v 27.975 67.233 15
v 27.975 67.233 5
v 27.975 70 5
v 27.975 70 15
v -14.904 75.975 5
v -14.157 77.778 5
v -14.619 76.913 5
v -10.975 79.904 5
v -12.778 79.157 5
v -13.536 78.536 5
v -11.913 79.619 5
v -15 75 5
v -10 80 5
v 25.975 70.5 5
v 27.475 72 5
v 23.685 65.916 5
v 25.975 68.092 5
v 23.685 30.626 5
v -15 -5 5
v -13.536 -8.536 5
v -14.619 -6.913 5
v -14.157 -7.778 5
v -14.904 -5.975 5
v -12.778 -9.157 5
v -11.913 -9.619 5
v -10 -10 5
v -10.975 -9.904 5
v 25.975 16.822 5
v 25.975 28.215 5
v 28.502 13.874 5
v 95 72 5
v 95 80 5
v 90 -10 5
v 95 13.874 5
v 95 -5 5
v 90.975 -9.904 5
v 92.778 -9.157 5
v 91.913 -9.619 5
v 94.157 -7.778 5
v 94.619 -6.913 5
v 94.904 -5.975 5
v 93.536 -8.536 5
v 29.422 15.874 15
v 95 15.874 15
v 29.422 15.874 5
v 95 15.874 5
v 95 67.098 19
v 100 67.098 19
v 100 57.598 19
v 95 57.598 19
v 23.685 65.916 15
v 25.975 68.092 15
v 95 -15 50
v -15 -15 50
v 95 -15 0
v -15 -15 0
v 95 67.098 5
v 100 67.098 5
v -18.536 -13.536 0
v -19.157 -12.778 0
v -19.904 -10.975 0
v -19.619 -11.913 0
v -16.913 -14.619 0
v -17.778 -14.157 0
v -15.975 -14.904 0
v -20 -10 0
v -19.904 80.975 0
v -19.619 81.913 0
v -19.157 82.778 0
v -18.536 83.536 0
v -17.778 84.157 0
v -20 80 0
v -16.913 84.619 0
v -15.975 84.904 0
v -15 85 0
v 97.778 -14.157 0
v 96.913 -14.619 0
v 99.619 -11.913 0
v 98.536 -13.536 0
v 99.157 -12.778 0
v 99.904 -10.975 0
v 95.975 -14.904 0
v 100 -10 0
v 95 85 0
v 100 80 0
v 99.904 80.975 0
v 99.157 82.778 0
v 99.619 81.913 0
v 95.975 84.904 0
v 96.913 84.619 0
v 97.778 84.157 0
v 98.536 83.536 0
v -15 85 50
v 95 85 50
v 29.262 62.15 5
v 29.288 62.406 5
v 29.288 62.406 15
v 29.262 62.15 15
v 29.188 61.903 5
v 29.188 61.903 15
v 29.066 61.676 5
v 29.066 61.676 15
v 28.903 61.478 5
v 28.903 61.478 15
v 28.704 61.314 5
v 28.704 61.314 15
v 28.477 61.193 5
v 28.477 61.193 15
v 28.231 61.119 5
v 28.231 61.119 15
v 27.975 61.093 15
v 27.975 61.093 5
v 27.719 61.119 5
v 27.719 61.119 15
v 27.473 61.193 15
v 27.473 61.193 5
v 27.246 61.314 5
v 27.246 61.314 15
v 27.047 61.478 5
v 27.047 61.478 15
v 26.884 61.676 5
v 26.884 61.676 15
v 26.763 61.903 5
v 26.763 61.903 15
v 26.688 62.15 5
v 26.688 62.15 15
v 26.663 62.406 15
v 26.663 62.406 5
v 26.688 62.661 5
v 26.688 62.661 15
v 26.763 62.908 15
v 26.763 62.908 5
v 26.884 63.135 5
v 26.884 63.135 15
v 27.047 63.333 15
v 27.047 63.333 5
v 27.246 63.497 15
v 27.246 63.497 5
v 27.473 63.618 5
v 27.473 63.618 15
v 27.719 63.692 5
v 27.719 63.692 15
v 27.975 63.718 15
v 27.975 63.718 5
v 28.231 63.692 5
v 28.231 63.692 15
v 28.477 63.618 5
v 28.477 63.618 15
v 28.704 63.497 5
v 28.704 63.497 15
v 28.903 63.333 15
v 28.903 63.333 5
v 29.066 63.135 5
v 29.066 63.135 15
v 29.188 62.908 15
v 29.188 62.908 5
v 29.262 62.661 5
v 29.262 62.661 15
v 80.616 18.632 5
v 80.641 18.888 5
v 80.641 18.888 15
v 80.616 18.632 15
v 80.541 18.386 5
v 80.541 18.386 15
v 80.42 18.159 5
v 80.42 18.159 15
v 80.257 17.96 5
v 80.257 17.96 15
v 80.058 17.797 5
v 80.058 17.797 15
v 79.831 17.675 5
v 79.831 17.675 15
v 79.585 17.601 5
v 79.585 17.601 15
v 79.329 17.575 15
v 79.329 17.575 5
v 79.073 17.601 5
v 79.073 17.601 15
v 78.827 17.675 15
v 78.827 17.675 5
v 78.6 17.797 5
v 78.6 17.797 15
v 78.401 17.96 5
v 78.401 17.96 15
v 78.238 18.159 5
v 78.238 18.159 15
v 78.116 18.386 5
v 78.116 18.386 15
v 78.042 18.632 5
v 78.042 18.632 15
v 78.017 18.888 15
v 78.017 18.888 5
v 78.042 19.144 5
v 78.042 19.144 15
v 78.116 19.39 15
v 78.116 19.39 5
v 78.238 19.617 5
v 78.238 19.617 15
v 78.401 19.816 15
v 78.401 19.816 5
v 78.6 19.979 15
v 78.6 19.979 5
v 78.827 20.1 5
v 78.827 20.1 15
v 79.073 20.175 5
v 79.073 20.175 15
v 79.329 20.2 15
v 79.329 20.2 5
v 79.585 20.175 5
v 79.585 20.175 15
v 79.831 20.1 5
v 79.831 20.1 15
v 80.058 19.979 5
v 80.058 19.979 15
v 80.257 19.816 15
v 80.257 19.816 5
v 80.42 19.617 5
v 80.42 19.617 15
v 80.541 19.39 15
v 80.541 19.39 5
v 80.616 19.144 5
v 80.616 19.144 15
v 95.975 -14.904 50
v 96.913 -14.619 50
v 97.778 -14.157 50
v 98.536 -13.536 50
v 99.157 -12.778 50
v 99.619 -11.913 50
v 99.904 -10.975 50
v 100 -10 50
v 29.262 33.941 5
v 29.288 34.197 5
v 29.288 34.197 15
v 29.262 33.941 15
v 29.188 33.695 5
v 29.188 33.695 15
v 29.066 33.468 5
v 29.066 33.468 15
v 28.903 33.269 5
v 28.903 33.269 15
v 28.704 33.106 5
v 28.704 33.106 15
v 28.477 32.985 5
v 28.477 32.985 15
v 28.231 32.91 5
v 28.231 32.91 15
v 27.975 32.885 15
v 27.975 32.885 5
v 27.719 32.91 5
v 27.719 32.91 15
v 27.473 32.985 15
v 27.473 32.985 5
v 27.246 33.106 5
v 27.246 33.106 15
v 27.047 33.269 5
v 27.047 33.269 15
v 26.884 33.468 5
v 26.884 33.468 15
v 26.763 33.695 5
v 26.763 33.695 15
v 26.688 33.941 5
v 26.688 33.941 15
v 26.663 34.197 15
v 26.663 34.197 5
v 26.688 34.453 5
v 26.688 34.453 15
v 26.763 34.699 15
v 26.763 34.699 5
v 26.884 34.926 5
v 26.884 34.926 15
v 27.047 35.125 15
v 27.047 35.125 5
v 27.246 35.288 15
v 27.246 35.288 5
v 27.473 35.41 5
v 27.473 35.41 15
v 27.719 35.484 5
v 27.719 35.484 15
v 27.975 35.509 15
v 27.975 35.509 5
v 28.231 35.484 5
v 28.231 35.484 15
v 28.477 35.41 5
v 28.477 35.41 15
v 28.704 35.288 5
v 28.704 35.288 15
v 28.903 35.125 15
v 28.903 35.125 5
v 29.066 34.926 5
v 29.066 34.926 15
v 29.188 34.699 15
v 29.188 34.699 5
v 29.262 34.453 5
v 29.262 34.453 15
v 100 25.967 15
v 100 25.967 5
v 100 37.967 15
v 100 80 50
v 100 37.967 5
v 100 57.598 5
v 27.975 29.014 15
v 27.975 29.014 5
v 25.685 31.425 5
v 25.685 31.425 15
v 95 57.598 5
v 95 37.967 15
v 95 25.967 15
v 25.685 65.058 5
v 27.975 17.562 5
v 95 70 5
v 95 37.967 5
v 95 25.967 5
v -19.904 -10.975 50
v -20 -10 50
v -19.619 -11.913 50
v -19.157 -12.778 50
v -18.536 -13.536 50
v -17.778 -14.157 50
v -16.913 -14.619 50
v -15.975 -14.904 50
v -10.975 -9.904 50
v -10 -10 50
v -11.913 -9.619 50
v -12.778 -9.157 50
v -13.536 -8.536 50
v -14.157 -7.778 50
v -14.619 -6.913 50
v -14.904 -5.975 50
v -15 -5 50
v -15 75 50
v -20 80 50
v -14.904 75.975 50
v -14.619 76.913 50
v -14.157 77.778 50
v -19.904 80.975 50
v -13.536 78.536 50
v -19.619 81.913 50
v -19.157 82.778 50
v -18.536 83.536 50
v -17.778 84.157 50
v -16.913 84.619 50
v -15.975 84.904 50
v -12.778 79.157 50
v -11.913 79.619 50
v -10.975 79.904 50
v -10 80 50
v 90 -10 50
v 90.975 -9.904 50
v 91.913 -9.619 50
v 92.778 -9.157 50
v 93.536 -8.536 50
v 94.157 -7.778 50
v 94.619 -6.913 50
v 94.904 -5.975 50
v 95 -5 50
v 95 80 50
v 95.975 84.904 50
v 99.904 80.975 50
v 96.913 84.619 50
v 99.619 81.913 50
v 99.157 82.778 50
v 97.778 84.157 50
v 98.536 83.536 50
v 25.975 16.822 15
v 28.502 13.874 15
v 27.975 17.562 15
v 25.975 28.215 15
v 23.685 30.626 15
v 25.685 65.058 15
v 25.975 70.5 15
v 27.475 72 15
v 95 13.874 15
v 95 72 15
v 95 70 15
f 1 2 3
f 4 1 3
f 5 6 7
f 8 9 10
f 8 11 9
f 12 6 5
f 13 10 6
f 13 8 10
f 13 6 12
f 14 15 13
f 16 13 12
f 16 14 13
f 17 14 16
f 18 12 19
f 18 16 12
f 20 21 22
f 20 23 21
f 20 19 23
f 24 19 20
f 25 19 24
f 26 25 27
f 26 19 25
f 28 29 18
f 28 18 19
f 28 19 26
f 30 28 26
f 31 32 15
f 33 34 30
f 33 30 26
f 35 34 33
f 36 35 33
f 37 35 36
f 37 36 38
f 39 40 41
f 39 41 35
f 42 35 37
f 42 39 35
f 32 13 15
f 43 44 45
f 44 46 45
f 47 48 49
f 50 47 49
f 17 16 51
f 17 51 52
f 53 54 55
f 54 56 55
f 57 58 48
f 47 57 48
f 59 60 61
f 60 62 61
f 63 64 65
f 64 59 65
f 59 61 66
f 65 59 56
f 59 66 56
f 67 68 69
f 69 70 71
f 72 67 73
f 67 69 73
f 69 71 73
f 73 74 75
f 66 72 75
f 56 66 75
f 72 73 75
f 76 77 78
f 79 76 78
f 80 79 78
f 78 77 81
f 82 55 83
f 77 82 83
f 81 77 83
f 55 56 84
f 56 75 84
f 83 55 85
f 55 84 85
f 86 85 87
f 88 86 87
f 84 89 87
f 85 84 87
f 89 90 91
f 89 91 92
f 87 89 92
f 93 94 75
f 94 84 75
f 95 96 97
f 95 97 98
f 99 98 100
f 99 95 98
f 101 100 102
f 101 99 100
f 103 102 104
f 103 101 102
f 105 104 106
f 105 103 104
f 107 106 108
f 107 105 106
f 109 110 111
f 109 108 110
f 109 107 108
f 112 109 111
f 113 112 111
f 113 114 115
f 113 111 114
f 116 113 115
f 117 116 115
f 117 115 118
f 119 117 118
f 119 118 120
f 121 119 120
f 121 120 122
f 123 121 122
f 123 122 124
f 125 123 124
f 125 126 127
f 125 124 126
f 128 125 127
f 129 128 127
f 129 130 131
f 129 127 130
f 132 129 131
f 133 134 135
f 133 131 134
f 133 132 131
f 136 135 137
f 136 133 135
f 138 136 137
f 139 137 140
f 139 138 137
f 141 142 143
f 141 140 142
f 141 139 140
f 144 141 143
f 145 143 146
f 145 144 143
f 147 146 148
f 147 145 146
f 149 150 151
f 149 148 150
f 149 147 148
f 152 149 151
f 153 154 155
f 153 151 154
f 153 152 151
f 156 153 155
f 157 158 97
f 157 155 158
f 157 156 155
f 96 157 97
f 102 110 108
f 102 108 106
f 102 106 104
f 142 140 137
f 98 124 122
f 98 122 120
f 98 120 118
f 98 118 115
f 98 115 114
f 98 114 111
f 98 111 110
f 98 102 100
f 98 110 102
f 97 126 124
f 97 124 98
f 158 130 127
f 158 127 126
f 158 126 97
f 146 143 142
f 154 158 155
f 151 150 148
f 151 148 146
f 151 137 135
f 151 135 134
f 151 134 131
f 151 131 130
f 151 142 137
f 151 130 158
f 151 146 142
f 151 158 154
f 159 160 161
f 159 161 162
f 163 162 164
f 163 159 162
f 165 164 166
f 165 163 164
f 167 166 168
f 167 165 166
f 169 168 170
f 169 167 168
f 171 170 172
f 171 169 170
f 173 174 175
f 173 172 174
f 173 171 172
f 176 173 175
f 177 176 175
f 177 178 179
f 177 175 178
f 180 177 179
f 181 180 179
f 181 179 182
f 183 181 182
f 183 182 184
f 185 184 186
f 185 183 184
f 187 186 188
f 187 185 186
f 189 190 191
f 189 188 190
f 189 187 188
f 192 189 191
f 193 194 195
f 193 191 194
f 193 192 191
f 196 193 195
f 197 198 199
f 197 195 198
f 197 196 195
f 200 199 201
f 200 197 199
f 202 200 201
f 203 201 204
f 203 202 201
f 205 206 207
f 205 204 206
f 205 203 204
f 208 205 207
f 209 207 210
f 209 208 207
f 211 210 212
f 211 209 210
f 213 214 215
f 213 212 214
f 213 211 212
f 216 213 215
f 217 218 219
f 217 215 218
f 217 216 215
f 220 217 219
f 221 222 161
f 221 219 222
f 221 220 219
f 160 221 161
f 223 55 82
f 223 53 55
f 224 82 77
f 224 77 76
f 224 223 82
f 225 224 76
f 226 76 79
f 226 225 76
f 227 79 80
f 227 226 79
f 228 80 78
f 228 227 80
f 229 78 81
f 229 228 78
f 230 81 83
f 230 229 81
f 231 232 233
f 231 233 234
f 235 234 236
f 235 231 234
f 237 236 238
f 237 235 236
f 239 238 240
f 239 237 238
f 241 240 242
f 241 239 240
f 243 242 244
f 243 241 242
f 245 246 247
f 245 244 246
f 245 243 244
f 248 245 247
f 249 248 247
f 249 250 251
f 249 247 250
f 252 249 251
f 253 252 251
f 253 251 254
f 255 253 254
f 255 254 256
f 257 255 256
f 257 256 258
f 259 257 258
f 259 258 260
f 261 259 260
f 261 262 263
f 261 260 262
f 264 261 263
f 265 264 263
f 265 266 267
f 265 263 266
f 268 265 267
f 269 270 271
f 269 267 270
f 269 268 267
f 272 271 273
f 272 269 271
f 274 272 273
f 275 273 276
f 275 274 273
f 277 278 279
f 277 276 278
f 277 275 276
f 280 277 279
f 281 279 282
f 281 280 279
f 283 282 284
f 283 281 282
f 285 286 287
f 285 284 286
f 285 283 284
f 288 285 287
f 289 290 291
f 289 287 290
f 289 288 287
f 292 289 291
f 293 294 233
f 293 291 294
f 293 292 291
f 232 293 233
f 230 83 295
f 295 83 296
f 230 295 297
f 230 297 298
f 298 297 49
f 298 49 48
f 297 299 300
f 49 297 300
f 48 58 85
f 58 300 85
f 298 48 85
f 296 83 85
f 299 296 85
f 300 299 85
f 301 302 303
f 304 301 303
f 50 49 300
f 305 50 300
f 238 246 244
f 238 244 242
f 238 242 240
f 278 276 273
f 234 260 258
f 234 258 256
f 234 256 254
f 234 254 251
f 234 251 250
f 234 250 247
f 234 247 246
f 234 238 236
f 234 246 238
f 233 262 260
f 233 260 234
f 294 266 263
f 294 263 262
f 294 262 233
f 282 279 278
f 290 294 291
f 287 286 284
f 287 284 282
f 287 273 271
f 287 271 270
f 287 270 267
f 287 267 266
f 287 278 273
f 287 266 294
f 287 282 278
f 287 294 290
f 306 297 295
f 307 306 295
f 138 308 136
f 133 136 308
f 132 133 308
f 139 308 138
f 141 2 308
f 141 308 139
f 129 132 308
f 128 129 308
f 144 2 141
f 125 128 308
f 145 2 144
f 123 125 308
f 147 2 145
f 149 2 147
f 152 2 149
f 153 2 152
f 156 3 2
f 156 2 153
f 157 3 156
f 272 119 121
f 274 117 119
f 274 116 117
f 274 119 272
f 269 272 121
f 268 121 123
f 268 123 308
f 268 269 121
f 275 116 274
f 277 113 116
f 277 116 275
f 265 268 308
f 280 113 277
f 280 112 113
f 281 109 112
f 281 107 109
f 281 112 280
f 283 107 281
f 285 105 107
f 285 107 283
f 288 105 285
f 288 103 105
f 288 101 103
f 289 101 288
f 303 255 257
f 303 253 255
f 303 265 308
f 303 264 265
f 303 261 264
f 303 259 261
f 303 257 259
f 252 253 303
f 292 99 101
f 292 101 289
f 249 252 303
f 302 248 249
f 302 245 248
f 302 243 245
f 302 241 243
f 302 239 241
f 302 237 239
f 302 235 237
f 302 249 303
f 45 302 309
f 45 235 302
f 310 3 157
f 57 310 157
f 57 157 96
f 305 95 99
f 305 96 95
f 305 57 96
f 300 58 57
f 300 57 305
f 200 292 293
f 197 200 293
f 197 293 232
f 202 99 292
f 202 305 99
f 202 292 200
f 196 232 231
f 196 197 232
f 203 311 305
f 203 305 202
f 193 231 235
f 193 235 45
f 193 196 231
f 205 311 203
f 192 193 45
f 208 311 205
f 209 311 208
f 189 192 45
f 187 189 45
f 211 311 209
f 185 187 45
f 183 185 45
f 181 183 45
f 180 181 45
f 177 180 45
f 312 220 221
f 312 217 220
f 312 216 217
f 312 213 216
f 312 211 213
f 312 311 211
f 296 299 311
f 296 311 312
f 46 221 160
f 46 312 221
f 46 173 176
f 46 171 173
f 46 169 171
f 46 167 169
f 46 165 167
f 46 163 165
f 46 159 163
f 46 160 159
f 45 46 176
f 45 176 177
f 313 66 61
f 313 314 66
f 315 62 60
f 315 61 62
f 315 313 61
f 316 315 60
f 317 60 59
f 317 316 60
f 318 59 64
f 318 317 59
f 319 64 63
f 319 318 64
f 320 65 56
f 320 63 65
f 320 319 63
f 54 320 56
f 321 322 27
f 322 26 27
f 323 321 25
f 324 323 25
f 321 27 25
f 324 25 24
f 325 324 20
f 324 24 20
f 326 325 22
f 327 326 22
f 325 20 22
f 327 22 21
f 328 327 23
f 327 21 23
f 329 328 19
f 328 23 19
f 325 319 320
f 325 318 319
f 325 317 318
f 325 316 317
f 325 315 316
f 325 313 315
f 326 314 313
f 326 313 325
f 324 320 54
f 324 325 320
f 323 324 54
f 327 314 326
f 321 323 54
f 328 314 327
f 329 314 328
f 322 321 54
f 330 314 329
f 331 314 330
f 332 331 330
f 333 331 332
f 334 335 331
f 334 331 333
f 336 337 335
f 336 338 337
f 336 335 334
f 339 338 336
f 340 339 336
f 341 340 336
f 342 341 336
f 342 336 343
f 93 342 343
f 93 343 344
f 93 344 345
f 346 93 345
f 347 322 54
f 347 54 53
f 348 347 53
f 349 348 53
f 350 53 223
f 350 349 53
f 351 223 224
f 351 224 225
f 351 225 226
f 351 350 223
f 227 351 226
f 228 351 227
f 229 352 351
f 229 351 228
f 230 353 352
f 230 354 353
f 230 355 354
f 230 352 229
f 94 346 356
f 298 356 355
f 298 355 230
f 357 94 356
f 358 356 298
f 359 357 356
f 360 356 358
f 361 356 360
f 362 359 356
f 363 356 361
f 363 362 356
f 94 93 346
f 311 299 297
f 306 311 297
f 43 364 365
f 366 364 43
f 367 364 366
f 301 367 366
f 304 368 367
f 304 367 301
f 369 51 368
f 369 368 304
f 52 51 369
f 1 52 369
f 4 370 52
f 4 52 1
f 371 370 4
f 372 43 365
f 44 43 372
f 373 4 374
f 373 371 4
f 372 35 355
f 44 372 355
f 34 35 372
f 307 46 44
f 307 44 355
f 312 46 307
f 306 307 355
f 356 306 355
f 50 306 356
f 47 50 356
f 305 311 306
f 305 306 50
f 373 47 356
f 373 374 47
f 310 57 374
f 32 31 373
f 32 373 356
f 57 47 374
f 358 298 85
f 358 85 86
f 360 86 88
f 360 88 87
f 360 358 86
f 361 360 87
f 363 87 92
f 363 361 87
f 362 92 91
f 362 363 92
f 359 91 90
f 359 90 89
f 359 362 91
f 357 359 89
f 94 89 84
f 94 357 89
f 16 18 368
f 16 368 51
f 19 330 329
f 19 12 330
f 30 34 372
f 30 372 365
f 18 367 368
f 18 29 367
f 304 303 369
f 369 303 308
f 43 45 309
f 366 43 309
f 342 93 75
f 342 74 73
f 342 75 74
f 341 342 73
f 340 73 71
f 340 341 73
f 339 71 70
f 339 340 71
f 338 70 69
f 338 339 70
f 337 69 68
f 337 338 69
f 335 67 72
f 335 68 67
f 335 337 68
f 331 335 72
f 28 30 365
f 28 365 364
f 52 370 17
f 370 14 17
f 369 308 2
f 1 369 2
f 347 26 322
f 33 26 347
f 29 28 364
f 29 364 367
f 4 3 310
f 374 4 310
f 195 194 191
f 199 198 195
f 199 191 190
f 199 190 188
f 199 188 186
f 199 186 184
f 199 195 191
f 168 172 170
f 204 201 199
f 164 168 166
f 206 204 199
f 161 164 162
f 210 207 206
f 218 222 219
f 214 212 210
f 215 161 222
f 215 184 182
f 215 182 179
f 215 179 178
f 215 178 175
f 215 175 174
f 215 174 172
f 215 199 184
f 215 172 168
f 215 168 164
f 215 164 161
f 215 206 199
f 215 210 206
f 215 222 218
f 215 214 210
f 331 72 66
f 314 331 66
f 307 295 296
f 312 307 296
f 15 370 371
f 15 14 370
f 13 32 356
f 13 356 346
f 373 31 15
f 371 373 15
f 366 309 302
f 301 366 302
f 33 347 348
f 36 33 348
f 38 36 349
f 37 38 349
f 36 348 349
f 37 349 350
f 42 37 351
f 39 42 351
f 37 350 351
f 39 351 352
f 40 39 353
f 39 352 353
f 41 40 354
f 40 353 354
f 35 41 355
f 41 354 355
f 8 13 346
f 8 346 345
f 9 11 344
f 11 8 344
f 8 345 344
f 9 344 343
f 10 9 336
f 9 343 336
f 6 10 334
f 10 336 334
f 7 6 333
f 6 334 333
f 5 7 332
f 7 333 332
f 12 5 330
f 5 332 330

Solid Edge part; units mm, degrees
sketch "Sketch1" plane through (0, 0, 0) normal (0, 0, 1) x (1, 0, 0)
  line L0 (-20, -15) -> (100, -15)
  line L1 (100, -15) -> (100, 85)
  line L2 (100, 85) -> (-20, 85)
  line L3 (-20, 85) -> (-20, -15)
  dimension "D1" = 85
  dimension "D2" = 100
  dimension "D3" = 100
  dimension "D4" = 120
extrude "Protrusion1" add sketch "Sketch1" along normal blind 50
shell "Parede" thickness 5 removed faces 1 at (-1.2, 2.6667, 50)
sketch "Sketch2" plane through (100, 0, 50) normal (1, 0, 0) x (0, 0, -1)
  line L0 (45, 67.0982) -> (31, 67.0982)
  line L1 (31, 67.0982) -> (31, 57.5982)
  line L2 (31, 57.5982) -> (45, 57.5982)
  line L3 (45, 67.0982) -> (45, 57.5982)
  line L4 (45, 37.9671) -> (45, 25.9671)
  line L5 (35, 25.9671) -> (45, 25.9671)
  line L6 (35, 37.9671) -> (35, 25.9671)
  line L7 (45, 37.9671) -> (35, 37.9671)
extrude "Cutout1" cut sketch "Sketch2" against normal up to next
sketch "Sketch3" plane through (2.5, 0, 5) normal (0, 0, 1) x (1, 0, 0)
  line L0 (25.4753, 67.2334) -> (25.4753, 70)
  line L1 (25.4753, 70) -> (92.5, 70)
  line L2 (92.5, 70) -> (92.5, 72)
  line L3 (92.5, 72) -> (24.9753, 72)
  line L4 (23.4753, 70.5) -> (24.9753, 72)
  line L5 (23.4753, 70.5) -> (23.4753, 68.092)
  line L6 (21.1849, 65.9162) -> (23.4753, 68.092)
  line L7 (21.1849, 30.6261) -> (21.1849, 65.9162)
  line L8 (23.4753, 28.2151) -> (21.1849, 30.6261)
  line L9 (23.4753, 16.8218) -> (23.4753, 28.2151)
  line L10 (26.002, 13.874) -> (23.4753, 16.8218)
  line L11 (92.5, 13.874) -> (26.002, 13.874)
  line L12 (92.5, 15.874) -> (92.5, 13.874)
  line L13 (92.5, 15.874) -> (26.9219, 15.874)
  line L14 (26.9219, 15.874) -> (25.4753, 17.5616)
  line L15 (25.4753, 17.5616) -> (25.4753, 29.0137)
  line L16 (25.4753, 29.0137) -> (23.1849, 31.4246)
  line L17 (23.1849, 31.4246) -> (23.1849, 65.0575)
  line L18 (23.1849, 65.0575) -> (25.4753, 67.2334)
  circle A0 centre (25.4753, 62.4055) radius 1.3122
  circle A1 centre (25.4753, 34.1973) radius 1.3122
  circle A2 centre (76.8288, 18.8877) radius 1.3122
  dimension "D1" = 2
extrude "Parede_Arduino" add sketch "Sketch3" along normal blind 10
fillet "Round_1" radius 5 7 edges at (-20, -15, 25) (100, -15, 25) (100, 85, 25) (-20, 85, 25) (-15, -10, 27.5) (-15, 80, 27.5) (95, -10, 27.5)
